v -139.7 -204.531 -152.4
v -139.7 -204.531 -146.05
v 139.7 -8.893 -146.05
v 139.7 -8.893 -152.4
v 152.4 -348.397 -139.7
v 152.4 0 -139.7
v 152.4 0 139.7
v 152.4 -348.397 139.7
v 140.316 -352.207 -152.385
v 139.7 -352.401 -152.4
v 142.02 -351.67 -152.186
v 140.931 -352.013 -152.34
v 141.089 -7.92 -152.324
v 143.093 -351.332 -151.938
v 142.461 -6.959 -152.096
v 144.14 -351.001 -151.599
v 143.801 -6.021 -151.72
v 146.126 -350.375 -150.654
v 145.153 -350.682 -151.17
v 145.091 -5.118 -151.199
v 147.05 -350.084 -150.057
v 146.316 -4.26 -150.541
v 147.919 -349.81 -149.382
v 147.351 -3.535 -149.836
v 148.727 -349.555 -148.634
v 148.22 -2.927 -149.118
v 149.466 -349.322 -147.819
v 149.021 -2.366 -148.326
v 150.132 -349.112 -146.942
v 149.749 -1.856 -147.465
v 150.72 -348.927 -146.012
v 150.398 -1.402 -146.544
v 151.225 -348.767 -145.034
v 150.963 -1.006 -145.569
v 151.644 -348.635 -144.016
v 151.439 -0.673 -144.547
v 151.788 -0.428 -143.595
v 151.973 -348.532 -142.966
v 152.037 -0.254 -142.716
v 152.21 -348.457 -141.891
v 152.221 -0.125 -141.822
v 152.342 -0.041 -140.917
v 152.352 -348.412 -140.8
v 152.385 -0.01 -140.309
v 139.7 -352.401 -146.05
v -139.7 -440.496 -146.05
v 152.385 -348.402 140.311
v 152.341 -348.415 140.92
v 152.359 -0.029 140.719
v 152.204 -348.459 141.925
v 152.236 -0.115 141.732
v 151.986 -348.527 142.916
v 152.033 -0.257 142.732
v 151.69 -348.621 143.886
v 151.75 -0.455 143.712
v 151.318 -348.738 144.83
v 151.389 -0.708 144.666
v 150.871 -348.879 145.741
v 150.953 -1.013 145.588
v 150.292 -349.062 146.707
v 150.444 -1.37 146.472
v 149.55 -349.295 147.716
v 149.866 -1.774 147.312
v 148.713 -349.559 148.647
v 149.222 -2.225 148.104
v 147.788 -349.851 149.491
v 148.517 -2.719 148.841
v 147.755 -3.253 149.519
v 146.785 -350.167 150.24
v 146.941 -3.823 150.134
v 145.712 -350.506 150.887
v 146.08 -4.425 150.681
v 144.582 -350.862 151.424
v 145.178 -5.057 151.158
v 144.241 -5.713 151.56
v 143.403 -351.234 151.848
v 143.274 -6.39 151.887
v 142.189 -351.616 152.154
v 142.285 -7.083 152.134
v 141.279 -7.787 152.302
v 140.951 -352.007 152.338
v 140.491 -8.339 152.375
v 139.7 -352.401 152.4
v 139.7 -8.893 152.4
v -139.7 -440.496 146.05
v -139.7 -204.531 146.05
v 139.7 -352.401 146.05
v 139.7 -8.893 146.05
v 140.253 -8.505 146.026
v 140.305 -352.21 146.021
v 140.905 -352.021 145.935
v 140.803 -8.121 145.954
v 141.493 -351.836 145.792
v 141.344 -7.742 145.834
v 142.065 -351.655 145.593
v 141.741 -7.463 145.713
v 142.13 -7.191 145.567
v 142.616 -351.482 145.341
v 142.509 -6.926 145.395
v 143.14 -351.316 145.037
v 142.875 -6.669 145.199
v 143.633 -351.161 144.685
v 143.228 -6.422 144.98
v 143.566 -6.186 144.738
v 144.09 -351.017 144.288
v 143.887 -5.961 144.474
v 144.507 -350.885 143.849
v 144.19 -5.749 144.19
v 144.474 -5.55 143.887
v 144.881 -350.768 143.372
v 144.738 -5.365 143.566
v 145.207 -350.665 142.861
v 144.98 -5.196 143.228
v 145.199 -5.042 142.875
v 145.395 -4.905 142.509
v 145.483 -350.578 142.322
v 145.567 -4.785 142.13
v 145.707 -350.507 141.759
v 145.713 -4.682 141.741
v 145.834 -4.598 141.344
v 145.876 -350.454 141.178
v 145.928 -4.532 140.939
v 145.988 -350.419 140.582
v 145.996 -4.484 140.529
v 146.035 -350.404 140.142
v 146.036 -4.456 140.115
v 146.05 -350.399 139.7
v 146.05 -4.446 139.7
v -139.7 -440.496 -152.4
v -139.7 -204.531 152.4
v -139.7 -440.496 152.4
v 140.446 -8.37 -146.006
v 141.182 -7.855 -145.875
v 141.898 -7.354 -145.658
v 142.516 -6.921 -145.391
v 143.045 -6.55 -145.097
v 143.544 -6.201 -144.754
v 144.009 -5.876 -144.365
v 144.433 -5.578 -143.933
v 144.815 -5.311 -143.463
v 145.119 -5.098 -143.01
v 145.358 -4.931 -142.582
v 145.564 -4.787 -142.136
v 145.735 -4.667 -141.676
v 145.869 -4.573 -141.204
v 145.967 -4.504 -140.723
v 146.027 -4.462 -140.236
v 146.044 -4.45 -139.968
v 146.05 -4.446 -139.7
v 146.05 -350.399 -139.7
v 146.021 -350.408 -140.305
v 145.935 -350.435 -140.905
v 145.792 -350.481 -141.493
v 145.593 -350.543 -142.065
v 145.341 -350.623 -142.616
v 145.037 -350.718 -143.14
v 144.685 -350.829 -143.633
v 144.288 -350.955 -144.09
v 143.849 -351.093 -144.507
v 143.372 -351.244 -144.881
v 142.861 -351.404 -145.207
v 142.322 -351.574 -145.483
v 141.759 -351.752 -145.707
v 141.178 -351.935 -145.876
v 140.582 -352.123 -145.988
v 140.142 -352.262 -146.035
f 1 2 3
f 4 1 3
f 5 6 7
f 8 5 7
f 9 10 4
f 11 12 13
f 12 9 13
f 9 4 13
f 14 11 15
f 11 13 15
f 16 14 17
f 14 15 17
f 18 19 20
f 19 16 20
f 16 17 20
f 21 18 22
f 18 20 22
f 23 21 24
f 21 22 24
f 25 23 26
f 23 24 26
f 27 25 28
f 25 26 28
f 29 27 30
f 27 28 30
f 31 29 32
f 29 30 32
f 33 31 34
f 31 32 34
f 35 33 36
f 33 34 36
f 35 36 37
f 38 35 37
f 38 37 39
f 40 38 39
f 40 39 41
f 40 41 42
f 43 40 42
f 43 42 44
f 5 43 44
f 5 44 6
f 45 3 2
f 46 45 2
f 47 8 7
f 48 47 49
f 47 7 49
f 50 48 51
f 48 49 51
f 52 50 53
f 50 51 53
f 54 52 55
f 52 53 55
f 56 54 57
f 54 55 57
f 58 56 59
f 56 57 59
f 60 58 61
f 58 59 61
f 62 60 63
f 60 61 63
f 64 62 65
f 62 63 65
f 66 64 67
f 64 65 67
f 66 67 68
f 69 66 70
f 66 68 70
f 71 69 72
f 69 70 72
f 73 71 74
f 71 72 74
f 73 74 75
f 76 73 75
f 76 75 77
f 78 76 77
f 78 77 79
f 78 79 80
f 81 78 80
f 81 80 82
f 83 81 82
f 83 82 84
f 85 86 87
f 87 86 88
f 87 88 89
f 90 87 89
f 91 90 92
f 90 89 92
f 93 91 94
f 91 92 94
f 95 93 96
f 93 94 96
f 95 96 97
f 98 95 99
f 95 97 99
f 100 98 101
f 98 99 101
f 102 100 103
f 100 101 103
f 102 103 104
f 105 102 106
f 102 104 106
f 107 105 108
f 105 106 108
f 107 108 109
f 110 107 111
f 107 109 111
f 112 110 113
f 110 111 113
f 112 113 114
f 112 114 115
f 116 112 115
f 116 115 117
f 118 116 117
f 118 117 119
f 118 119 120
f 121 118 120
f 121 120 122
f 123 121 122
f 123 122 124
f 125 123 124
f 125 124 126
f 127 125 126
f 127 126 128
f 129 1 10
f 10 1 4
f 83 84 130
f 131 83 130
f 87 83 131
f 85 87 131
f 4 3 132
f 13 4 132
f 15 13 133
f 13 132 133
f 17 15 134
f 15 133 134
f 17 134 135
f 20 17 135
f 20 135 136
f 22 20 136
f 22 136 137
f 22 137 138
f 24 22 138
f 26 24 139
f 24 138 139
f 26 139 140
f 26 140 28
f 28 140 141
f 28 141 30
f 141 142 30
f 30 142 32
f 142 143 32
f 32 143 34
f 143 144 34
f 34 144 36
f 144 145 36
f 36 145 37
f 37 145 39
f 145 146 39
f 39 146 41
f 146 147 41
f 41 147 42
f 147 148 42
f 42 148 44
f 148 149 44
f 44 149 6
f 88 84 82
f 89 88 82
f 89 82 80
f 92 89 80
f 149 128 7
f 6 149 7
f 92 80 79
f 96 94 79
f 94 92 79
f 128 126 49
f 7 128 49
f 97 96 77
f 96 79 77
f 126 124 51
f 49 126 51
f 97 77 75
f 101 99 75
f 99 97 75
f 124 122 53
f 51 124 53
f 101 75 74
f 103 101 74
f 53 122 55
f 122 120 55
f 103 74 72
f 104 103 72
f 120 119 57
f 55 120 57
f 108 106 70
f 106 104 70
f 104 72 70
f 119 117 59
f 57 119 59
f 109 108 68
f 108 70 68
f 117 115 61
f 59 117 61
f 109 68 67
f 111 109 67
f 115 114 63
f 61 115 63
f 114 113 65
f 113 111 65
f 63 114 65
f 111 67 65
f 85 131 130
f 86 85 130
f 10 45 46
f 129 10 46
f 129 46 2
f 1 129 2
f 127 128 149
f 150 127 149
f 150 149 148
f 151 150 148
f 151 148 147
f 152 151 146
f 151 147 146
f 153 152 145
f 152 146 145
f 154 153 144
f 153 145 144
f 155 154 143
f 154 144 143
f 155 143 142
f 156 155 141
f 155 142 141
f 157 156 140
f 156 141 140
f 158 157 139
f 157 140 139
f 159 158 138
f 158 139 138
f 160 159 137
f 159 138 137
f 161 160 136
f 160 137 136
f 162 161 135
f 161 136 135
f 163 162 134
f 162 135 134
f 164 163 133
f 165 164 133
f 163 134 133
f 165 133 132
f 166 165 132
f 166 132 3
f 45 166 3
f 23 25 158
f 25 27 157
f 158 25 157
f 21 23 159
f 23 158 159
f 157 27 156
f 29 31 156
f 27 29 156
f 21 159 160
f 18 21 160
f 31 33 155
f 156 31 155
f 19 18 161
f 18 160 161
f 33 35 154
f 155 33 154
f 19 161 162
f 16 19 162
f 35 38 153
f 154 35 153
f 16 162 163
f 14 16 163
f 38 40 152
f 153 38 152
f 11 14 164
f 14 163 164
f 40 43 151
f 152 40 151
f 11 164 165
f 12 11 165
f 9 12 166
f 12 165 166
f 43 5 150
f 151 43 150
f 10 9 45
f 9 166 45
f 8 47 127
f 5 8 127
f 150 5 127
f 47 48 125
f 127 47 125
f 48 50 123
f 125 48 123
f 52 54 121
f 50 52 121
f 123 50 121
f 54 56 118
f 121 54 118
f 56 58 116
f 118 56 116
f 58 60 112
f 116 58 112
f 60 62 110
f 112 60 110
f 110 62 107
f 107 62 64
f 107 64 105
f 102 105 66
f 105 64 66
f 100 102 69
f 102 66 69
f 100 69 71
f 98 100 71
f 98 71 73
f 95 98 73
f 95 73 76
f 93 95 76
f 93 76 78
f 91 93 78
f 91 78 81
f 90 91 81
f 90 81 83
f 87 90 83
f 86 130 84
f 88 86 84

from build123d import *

# Parameters (mm, degrees)
F1_DEPTH = 444.5
F3_DEPTH = 304.801


with BuildPart() as f1:
    # F0 (on Front) → F1 (new body)
    with BuildSketch(Plane.XZ):
        with BuildLine():
            Line((-139.7, -152.4), (139.7, -152.4))
            ThreePointArc((139.7, -152.4), (148.6802561211, -148.6802561211), (152.4, -139.7))
            Line((152.4, -139.7), (152.4, 139.7))
            ThreePointArc((152.4, 139.7), (148.6802561211, 148.6802561211), (139.7, 152.4))
            Line((139.7, 152.4), (-139.7, 152.4))
            ThreePointArc((-139.7, 152.4), (-148.6802561211, 148.6802561211), (-152.4, 139.7))
            Line((-152.4, 139.7), (-152.4, -139.7))
            ThreePointArc((-152.4, -139.7), (-148.6802561211, -148.6802561211), (-139.7, -152.4))
        make_face()
        with BuildLine():
            Line((-139.7, 146.05), (139.7, 146.05))
            ThreePointArc((139.7, 146.05), (144.1901280605, 144.1901280605), (146.05, 139.7))
            Line((146.05, 139.7), (146.05, -139.7))
            ThreePointArc((146.05, -139.7), (144.1901280605, -144.1901280605), (139.7, -146.05))
            Line((139.7, -146.05), (-139.7, -146.05))
            ThreePointArc((-139.7, -146.05), (-144.1901280605, -144.1901280605), (-146.05, -139.7))
            Line((-146.05, -139.7), (-146.05, 139.7))
            ThreePointArc((-146.05, 139.7), (-144.1901280605, 144.1901280605), (-139.7, 146.05))
        make_face(mode=Mode.SUBTRACT)
    extrude(amount=F1_DEPTH)

    # F2 (on face) → F3 (cut, through all)
    with BuildSketch(Plane.XY.offset(152.4)):
        Polygon((-139.7, -444.5), (139.7, -444.5), (139.7, -352.4012237684), (-139.7, -440.4957053812), align=None)
        Polygon((139.7, -444.5), (152.4, -444.5), (152.4, -348.3969291497), (139.7, -352.4012237684), align=None)
        Polygon((-152.4, -444.5), (-139.7, -444.5), (-139.7, -440.4957053812), align=None)
        Polygon((139.7, -8.8926357353), (139.7, 0), (-139.7, 0), (-139.7, -204.5306219111), align=None)
        Polygon((-139.7, -204.5306219111), (-139.7, 0), (-152.4, 0), (-152.4, -213.4232576463), align=None)
        Polygon((139.7, -8.8926357353), (152.4, 0), (139.7, 0), align=None)
        Polygon((-152.4, -444.5), (-139.7, -440.4957053812), (-139.7, -204.5306219111), (-152.4, -213.4232576463), align=None)
    extrude(amount=-F3_DEPTH, mode=Mode.SUBTRACT)


solid = f1.part
